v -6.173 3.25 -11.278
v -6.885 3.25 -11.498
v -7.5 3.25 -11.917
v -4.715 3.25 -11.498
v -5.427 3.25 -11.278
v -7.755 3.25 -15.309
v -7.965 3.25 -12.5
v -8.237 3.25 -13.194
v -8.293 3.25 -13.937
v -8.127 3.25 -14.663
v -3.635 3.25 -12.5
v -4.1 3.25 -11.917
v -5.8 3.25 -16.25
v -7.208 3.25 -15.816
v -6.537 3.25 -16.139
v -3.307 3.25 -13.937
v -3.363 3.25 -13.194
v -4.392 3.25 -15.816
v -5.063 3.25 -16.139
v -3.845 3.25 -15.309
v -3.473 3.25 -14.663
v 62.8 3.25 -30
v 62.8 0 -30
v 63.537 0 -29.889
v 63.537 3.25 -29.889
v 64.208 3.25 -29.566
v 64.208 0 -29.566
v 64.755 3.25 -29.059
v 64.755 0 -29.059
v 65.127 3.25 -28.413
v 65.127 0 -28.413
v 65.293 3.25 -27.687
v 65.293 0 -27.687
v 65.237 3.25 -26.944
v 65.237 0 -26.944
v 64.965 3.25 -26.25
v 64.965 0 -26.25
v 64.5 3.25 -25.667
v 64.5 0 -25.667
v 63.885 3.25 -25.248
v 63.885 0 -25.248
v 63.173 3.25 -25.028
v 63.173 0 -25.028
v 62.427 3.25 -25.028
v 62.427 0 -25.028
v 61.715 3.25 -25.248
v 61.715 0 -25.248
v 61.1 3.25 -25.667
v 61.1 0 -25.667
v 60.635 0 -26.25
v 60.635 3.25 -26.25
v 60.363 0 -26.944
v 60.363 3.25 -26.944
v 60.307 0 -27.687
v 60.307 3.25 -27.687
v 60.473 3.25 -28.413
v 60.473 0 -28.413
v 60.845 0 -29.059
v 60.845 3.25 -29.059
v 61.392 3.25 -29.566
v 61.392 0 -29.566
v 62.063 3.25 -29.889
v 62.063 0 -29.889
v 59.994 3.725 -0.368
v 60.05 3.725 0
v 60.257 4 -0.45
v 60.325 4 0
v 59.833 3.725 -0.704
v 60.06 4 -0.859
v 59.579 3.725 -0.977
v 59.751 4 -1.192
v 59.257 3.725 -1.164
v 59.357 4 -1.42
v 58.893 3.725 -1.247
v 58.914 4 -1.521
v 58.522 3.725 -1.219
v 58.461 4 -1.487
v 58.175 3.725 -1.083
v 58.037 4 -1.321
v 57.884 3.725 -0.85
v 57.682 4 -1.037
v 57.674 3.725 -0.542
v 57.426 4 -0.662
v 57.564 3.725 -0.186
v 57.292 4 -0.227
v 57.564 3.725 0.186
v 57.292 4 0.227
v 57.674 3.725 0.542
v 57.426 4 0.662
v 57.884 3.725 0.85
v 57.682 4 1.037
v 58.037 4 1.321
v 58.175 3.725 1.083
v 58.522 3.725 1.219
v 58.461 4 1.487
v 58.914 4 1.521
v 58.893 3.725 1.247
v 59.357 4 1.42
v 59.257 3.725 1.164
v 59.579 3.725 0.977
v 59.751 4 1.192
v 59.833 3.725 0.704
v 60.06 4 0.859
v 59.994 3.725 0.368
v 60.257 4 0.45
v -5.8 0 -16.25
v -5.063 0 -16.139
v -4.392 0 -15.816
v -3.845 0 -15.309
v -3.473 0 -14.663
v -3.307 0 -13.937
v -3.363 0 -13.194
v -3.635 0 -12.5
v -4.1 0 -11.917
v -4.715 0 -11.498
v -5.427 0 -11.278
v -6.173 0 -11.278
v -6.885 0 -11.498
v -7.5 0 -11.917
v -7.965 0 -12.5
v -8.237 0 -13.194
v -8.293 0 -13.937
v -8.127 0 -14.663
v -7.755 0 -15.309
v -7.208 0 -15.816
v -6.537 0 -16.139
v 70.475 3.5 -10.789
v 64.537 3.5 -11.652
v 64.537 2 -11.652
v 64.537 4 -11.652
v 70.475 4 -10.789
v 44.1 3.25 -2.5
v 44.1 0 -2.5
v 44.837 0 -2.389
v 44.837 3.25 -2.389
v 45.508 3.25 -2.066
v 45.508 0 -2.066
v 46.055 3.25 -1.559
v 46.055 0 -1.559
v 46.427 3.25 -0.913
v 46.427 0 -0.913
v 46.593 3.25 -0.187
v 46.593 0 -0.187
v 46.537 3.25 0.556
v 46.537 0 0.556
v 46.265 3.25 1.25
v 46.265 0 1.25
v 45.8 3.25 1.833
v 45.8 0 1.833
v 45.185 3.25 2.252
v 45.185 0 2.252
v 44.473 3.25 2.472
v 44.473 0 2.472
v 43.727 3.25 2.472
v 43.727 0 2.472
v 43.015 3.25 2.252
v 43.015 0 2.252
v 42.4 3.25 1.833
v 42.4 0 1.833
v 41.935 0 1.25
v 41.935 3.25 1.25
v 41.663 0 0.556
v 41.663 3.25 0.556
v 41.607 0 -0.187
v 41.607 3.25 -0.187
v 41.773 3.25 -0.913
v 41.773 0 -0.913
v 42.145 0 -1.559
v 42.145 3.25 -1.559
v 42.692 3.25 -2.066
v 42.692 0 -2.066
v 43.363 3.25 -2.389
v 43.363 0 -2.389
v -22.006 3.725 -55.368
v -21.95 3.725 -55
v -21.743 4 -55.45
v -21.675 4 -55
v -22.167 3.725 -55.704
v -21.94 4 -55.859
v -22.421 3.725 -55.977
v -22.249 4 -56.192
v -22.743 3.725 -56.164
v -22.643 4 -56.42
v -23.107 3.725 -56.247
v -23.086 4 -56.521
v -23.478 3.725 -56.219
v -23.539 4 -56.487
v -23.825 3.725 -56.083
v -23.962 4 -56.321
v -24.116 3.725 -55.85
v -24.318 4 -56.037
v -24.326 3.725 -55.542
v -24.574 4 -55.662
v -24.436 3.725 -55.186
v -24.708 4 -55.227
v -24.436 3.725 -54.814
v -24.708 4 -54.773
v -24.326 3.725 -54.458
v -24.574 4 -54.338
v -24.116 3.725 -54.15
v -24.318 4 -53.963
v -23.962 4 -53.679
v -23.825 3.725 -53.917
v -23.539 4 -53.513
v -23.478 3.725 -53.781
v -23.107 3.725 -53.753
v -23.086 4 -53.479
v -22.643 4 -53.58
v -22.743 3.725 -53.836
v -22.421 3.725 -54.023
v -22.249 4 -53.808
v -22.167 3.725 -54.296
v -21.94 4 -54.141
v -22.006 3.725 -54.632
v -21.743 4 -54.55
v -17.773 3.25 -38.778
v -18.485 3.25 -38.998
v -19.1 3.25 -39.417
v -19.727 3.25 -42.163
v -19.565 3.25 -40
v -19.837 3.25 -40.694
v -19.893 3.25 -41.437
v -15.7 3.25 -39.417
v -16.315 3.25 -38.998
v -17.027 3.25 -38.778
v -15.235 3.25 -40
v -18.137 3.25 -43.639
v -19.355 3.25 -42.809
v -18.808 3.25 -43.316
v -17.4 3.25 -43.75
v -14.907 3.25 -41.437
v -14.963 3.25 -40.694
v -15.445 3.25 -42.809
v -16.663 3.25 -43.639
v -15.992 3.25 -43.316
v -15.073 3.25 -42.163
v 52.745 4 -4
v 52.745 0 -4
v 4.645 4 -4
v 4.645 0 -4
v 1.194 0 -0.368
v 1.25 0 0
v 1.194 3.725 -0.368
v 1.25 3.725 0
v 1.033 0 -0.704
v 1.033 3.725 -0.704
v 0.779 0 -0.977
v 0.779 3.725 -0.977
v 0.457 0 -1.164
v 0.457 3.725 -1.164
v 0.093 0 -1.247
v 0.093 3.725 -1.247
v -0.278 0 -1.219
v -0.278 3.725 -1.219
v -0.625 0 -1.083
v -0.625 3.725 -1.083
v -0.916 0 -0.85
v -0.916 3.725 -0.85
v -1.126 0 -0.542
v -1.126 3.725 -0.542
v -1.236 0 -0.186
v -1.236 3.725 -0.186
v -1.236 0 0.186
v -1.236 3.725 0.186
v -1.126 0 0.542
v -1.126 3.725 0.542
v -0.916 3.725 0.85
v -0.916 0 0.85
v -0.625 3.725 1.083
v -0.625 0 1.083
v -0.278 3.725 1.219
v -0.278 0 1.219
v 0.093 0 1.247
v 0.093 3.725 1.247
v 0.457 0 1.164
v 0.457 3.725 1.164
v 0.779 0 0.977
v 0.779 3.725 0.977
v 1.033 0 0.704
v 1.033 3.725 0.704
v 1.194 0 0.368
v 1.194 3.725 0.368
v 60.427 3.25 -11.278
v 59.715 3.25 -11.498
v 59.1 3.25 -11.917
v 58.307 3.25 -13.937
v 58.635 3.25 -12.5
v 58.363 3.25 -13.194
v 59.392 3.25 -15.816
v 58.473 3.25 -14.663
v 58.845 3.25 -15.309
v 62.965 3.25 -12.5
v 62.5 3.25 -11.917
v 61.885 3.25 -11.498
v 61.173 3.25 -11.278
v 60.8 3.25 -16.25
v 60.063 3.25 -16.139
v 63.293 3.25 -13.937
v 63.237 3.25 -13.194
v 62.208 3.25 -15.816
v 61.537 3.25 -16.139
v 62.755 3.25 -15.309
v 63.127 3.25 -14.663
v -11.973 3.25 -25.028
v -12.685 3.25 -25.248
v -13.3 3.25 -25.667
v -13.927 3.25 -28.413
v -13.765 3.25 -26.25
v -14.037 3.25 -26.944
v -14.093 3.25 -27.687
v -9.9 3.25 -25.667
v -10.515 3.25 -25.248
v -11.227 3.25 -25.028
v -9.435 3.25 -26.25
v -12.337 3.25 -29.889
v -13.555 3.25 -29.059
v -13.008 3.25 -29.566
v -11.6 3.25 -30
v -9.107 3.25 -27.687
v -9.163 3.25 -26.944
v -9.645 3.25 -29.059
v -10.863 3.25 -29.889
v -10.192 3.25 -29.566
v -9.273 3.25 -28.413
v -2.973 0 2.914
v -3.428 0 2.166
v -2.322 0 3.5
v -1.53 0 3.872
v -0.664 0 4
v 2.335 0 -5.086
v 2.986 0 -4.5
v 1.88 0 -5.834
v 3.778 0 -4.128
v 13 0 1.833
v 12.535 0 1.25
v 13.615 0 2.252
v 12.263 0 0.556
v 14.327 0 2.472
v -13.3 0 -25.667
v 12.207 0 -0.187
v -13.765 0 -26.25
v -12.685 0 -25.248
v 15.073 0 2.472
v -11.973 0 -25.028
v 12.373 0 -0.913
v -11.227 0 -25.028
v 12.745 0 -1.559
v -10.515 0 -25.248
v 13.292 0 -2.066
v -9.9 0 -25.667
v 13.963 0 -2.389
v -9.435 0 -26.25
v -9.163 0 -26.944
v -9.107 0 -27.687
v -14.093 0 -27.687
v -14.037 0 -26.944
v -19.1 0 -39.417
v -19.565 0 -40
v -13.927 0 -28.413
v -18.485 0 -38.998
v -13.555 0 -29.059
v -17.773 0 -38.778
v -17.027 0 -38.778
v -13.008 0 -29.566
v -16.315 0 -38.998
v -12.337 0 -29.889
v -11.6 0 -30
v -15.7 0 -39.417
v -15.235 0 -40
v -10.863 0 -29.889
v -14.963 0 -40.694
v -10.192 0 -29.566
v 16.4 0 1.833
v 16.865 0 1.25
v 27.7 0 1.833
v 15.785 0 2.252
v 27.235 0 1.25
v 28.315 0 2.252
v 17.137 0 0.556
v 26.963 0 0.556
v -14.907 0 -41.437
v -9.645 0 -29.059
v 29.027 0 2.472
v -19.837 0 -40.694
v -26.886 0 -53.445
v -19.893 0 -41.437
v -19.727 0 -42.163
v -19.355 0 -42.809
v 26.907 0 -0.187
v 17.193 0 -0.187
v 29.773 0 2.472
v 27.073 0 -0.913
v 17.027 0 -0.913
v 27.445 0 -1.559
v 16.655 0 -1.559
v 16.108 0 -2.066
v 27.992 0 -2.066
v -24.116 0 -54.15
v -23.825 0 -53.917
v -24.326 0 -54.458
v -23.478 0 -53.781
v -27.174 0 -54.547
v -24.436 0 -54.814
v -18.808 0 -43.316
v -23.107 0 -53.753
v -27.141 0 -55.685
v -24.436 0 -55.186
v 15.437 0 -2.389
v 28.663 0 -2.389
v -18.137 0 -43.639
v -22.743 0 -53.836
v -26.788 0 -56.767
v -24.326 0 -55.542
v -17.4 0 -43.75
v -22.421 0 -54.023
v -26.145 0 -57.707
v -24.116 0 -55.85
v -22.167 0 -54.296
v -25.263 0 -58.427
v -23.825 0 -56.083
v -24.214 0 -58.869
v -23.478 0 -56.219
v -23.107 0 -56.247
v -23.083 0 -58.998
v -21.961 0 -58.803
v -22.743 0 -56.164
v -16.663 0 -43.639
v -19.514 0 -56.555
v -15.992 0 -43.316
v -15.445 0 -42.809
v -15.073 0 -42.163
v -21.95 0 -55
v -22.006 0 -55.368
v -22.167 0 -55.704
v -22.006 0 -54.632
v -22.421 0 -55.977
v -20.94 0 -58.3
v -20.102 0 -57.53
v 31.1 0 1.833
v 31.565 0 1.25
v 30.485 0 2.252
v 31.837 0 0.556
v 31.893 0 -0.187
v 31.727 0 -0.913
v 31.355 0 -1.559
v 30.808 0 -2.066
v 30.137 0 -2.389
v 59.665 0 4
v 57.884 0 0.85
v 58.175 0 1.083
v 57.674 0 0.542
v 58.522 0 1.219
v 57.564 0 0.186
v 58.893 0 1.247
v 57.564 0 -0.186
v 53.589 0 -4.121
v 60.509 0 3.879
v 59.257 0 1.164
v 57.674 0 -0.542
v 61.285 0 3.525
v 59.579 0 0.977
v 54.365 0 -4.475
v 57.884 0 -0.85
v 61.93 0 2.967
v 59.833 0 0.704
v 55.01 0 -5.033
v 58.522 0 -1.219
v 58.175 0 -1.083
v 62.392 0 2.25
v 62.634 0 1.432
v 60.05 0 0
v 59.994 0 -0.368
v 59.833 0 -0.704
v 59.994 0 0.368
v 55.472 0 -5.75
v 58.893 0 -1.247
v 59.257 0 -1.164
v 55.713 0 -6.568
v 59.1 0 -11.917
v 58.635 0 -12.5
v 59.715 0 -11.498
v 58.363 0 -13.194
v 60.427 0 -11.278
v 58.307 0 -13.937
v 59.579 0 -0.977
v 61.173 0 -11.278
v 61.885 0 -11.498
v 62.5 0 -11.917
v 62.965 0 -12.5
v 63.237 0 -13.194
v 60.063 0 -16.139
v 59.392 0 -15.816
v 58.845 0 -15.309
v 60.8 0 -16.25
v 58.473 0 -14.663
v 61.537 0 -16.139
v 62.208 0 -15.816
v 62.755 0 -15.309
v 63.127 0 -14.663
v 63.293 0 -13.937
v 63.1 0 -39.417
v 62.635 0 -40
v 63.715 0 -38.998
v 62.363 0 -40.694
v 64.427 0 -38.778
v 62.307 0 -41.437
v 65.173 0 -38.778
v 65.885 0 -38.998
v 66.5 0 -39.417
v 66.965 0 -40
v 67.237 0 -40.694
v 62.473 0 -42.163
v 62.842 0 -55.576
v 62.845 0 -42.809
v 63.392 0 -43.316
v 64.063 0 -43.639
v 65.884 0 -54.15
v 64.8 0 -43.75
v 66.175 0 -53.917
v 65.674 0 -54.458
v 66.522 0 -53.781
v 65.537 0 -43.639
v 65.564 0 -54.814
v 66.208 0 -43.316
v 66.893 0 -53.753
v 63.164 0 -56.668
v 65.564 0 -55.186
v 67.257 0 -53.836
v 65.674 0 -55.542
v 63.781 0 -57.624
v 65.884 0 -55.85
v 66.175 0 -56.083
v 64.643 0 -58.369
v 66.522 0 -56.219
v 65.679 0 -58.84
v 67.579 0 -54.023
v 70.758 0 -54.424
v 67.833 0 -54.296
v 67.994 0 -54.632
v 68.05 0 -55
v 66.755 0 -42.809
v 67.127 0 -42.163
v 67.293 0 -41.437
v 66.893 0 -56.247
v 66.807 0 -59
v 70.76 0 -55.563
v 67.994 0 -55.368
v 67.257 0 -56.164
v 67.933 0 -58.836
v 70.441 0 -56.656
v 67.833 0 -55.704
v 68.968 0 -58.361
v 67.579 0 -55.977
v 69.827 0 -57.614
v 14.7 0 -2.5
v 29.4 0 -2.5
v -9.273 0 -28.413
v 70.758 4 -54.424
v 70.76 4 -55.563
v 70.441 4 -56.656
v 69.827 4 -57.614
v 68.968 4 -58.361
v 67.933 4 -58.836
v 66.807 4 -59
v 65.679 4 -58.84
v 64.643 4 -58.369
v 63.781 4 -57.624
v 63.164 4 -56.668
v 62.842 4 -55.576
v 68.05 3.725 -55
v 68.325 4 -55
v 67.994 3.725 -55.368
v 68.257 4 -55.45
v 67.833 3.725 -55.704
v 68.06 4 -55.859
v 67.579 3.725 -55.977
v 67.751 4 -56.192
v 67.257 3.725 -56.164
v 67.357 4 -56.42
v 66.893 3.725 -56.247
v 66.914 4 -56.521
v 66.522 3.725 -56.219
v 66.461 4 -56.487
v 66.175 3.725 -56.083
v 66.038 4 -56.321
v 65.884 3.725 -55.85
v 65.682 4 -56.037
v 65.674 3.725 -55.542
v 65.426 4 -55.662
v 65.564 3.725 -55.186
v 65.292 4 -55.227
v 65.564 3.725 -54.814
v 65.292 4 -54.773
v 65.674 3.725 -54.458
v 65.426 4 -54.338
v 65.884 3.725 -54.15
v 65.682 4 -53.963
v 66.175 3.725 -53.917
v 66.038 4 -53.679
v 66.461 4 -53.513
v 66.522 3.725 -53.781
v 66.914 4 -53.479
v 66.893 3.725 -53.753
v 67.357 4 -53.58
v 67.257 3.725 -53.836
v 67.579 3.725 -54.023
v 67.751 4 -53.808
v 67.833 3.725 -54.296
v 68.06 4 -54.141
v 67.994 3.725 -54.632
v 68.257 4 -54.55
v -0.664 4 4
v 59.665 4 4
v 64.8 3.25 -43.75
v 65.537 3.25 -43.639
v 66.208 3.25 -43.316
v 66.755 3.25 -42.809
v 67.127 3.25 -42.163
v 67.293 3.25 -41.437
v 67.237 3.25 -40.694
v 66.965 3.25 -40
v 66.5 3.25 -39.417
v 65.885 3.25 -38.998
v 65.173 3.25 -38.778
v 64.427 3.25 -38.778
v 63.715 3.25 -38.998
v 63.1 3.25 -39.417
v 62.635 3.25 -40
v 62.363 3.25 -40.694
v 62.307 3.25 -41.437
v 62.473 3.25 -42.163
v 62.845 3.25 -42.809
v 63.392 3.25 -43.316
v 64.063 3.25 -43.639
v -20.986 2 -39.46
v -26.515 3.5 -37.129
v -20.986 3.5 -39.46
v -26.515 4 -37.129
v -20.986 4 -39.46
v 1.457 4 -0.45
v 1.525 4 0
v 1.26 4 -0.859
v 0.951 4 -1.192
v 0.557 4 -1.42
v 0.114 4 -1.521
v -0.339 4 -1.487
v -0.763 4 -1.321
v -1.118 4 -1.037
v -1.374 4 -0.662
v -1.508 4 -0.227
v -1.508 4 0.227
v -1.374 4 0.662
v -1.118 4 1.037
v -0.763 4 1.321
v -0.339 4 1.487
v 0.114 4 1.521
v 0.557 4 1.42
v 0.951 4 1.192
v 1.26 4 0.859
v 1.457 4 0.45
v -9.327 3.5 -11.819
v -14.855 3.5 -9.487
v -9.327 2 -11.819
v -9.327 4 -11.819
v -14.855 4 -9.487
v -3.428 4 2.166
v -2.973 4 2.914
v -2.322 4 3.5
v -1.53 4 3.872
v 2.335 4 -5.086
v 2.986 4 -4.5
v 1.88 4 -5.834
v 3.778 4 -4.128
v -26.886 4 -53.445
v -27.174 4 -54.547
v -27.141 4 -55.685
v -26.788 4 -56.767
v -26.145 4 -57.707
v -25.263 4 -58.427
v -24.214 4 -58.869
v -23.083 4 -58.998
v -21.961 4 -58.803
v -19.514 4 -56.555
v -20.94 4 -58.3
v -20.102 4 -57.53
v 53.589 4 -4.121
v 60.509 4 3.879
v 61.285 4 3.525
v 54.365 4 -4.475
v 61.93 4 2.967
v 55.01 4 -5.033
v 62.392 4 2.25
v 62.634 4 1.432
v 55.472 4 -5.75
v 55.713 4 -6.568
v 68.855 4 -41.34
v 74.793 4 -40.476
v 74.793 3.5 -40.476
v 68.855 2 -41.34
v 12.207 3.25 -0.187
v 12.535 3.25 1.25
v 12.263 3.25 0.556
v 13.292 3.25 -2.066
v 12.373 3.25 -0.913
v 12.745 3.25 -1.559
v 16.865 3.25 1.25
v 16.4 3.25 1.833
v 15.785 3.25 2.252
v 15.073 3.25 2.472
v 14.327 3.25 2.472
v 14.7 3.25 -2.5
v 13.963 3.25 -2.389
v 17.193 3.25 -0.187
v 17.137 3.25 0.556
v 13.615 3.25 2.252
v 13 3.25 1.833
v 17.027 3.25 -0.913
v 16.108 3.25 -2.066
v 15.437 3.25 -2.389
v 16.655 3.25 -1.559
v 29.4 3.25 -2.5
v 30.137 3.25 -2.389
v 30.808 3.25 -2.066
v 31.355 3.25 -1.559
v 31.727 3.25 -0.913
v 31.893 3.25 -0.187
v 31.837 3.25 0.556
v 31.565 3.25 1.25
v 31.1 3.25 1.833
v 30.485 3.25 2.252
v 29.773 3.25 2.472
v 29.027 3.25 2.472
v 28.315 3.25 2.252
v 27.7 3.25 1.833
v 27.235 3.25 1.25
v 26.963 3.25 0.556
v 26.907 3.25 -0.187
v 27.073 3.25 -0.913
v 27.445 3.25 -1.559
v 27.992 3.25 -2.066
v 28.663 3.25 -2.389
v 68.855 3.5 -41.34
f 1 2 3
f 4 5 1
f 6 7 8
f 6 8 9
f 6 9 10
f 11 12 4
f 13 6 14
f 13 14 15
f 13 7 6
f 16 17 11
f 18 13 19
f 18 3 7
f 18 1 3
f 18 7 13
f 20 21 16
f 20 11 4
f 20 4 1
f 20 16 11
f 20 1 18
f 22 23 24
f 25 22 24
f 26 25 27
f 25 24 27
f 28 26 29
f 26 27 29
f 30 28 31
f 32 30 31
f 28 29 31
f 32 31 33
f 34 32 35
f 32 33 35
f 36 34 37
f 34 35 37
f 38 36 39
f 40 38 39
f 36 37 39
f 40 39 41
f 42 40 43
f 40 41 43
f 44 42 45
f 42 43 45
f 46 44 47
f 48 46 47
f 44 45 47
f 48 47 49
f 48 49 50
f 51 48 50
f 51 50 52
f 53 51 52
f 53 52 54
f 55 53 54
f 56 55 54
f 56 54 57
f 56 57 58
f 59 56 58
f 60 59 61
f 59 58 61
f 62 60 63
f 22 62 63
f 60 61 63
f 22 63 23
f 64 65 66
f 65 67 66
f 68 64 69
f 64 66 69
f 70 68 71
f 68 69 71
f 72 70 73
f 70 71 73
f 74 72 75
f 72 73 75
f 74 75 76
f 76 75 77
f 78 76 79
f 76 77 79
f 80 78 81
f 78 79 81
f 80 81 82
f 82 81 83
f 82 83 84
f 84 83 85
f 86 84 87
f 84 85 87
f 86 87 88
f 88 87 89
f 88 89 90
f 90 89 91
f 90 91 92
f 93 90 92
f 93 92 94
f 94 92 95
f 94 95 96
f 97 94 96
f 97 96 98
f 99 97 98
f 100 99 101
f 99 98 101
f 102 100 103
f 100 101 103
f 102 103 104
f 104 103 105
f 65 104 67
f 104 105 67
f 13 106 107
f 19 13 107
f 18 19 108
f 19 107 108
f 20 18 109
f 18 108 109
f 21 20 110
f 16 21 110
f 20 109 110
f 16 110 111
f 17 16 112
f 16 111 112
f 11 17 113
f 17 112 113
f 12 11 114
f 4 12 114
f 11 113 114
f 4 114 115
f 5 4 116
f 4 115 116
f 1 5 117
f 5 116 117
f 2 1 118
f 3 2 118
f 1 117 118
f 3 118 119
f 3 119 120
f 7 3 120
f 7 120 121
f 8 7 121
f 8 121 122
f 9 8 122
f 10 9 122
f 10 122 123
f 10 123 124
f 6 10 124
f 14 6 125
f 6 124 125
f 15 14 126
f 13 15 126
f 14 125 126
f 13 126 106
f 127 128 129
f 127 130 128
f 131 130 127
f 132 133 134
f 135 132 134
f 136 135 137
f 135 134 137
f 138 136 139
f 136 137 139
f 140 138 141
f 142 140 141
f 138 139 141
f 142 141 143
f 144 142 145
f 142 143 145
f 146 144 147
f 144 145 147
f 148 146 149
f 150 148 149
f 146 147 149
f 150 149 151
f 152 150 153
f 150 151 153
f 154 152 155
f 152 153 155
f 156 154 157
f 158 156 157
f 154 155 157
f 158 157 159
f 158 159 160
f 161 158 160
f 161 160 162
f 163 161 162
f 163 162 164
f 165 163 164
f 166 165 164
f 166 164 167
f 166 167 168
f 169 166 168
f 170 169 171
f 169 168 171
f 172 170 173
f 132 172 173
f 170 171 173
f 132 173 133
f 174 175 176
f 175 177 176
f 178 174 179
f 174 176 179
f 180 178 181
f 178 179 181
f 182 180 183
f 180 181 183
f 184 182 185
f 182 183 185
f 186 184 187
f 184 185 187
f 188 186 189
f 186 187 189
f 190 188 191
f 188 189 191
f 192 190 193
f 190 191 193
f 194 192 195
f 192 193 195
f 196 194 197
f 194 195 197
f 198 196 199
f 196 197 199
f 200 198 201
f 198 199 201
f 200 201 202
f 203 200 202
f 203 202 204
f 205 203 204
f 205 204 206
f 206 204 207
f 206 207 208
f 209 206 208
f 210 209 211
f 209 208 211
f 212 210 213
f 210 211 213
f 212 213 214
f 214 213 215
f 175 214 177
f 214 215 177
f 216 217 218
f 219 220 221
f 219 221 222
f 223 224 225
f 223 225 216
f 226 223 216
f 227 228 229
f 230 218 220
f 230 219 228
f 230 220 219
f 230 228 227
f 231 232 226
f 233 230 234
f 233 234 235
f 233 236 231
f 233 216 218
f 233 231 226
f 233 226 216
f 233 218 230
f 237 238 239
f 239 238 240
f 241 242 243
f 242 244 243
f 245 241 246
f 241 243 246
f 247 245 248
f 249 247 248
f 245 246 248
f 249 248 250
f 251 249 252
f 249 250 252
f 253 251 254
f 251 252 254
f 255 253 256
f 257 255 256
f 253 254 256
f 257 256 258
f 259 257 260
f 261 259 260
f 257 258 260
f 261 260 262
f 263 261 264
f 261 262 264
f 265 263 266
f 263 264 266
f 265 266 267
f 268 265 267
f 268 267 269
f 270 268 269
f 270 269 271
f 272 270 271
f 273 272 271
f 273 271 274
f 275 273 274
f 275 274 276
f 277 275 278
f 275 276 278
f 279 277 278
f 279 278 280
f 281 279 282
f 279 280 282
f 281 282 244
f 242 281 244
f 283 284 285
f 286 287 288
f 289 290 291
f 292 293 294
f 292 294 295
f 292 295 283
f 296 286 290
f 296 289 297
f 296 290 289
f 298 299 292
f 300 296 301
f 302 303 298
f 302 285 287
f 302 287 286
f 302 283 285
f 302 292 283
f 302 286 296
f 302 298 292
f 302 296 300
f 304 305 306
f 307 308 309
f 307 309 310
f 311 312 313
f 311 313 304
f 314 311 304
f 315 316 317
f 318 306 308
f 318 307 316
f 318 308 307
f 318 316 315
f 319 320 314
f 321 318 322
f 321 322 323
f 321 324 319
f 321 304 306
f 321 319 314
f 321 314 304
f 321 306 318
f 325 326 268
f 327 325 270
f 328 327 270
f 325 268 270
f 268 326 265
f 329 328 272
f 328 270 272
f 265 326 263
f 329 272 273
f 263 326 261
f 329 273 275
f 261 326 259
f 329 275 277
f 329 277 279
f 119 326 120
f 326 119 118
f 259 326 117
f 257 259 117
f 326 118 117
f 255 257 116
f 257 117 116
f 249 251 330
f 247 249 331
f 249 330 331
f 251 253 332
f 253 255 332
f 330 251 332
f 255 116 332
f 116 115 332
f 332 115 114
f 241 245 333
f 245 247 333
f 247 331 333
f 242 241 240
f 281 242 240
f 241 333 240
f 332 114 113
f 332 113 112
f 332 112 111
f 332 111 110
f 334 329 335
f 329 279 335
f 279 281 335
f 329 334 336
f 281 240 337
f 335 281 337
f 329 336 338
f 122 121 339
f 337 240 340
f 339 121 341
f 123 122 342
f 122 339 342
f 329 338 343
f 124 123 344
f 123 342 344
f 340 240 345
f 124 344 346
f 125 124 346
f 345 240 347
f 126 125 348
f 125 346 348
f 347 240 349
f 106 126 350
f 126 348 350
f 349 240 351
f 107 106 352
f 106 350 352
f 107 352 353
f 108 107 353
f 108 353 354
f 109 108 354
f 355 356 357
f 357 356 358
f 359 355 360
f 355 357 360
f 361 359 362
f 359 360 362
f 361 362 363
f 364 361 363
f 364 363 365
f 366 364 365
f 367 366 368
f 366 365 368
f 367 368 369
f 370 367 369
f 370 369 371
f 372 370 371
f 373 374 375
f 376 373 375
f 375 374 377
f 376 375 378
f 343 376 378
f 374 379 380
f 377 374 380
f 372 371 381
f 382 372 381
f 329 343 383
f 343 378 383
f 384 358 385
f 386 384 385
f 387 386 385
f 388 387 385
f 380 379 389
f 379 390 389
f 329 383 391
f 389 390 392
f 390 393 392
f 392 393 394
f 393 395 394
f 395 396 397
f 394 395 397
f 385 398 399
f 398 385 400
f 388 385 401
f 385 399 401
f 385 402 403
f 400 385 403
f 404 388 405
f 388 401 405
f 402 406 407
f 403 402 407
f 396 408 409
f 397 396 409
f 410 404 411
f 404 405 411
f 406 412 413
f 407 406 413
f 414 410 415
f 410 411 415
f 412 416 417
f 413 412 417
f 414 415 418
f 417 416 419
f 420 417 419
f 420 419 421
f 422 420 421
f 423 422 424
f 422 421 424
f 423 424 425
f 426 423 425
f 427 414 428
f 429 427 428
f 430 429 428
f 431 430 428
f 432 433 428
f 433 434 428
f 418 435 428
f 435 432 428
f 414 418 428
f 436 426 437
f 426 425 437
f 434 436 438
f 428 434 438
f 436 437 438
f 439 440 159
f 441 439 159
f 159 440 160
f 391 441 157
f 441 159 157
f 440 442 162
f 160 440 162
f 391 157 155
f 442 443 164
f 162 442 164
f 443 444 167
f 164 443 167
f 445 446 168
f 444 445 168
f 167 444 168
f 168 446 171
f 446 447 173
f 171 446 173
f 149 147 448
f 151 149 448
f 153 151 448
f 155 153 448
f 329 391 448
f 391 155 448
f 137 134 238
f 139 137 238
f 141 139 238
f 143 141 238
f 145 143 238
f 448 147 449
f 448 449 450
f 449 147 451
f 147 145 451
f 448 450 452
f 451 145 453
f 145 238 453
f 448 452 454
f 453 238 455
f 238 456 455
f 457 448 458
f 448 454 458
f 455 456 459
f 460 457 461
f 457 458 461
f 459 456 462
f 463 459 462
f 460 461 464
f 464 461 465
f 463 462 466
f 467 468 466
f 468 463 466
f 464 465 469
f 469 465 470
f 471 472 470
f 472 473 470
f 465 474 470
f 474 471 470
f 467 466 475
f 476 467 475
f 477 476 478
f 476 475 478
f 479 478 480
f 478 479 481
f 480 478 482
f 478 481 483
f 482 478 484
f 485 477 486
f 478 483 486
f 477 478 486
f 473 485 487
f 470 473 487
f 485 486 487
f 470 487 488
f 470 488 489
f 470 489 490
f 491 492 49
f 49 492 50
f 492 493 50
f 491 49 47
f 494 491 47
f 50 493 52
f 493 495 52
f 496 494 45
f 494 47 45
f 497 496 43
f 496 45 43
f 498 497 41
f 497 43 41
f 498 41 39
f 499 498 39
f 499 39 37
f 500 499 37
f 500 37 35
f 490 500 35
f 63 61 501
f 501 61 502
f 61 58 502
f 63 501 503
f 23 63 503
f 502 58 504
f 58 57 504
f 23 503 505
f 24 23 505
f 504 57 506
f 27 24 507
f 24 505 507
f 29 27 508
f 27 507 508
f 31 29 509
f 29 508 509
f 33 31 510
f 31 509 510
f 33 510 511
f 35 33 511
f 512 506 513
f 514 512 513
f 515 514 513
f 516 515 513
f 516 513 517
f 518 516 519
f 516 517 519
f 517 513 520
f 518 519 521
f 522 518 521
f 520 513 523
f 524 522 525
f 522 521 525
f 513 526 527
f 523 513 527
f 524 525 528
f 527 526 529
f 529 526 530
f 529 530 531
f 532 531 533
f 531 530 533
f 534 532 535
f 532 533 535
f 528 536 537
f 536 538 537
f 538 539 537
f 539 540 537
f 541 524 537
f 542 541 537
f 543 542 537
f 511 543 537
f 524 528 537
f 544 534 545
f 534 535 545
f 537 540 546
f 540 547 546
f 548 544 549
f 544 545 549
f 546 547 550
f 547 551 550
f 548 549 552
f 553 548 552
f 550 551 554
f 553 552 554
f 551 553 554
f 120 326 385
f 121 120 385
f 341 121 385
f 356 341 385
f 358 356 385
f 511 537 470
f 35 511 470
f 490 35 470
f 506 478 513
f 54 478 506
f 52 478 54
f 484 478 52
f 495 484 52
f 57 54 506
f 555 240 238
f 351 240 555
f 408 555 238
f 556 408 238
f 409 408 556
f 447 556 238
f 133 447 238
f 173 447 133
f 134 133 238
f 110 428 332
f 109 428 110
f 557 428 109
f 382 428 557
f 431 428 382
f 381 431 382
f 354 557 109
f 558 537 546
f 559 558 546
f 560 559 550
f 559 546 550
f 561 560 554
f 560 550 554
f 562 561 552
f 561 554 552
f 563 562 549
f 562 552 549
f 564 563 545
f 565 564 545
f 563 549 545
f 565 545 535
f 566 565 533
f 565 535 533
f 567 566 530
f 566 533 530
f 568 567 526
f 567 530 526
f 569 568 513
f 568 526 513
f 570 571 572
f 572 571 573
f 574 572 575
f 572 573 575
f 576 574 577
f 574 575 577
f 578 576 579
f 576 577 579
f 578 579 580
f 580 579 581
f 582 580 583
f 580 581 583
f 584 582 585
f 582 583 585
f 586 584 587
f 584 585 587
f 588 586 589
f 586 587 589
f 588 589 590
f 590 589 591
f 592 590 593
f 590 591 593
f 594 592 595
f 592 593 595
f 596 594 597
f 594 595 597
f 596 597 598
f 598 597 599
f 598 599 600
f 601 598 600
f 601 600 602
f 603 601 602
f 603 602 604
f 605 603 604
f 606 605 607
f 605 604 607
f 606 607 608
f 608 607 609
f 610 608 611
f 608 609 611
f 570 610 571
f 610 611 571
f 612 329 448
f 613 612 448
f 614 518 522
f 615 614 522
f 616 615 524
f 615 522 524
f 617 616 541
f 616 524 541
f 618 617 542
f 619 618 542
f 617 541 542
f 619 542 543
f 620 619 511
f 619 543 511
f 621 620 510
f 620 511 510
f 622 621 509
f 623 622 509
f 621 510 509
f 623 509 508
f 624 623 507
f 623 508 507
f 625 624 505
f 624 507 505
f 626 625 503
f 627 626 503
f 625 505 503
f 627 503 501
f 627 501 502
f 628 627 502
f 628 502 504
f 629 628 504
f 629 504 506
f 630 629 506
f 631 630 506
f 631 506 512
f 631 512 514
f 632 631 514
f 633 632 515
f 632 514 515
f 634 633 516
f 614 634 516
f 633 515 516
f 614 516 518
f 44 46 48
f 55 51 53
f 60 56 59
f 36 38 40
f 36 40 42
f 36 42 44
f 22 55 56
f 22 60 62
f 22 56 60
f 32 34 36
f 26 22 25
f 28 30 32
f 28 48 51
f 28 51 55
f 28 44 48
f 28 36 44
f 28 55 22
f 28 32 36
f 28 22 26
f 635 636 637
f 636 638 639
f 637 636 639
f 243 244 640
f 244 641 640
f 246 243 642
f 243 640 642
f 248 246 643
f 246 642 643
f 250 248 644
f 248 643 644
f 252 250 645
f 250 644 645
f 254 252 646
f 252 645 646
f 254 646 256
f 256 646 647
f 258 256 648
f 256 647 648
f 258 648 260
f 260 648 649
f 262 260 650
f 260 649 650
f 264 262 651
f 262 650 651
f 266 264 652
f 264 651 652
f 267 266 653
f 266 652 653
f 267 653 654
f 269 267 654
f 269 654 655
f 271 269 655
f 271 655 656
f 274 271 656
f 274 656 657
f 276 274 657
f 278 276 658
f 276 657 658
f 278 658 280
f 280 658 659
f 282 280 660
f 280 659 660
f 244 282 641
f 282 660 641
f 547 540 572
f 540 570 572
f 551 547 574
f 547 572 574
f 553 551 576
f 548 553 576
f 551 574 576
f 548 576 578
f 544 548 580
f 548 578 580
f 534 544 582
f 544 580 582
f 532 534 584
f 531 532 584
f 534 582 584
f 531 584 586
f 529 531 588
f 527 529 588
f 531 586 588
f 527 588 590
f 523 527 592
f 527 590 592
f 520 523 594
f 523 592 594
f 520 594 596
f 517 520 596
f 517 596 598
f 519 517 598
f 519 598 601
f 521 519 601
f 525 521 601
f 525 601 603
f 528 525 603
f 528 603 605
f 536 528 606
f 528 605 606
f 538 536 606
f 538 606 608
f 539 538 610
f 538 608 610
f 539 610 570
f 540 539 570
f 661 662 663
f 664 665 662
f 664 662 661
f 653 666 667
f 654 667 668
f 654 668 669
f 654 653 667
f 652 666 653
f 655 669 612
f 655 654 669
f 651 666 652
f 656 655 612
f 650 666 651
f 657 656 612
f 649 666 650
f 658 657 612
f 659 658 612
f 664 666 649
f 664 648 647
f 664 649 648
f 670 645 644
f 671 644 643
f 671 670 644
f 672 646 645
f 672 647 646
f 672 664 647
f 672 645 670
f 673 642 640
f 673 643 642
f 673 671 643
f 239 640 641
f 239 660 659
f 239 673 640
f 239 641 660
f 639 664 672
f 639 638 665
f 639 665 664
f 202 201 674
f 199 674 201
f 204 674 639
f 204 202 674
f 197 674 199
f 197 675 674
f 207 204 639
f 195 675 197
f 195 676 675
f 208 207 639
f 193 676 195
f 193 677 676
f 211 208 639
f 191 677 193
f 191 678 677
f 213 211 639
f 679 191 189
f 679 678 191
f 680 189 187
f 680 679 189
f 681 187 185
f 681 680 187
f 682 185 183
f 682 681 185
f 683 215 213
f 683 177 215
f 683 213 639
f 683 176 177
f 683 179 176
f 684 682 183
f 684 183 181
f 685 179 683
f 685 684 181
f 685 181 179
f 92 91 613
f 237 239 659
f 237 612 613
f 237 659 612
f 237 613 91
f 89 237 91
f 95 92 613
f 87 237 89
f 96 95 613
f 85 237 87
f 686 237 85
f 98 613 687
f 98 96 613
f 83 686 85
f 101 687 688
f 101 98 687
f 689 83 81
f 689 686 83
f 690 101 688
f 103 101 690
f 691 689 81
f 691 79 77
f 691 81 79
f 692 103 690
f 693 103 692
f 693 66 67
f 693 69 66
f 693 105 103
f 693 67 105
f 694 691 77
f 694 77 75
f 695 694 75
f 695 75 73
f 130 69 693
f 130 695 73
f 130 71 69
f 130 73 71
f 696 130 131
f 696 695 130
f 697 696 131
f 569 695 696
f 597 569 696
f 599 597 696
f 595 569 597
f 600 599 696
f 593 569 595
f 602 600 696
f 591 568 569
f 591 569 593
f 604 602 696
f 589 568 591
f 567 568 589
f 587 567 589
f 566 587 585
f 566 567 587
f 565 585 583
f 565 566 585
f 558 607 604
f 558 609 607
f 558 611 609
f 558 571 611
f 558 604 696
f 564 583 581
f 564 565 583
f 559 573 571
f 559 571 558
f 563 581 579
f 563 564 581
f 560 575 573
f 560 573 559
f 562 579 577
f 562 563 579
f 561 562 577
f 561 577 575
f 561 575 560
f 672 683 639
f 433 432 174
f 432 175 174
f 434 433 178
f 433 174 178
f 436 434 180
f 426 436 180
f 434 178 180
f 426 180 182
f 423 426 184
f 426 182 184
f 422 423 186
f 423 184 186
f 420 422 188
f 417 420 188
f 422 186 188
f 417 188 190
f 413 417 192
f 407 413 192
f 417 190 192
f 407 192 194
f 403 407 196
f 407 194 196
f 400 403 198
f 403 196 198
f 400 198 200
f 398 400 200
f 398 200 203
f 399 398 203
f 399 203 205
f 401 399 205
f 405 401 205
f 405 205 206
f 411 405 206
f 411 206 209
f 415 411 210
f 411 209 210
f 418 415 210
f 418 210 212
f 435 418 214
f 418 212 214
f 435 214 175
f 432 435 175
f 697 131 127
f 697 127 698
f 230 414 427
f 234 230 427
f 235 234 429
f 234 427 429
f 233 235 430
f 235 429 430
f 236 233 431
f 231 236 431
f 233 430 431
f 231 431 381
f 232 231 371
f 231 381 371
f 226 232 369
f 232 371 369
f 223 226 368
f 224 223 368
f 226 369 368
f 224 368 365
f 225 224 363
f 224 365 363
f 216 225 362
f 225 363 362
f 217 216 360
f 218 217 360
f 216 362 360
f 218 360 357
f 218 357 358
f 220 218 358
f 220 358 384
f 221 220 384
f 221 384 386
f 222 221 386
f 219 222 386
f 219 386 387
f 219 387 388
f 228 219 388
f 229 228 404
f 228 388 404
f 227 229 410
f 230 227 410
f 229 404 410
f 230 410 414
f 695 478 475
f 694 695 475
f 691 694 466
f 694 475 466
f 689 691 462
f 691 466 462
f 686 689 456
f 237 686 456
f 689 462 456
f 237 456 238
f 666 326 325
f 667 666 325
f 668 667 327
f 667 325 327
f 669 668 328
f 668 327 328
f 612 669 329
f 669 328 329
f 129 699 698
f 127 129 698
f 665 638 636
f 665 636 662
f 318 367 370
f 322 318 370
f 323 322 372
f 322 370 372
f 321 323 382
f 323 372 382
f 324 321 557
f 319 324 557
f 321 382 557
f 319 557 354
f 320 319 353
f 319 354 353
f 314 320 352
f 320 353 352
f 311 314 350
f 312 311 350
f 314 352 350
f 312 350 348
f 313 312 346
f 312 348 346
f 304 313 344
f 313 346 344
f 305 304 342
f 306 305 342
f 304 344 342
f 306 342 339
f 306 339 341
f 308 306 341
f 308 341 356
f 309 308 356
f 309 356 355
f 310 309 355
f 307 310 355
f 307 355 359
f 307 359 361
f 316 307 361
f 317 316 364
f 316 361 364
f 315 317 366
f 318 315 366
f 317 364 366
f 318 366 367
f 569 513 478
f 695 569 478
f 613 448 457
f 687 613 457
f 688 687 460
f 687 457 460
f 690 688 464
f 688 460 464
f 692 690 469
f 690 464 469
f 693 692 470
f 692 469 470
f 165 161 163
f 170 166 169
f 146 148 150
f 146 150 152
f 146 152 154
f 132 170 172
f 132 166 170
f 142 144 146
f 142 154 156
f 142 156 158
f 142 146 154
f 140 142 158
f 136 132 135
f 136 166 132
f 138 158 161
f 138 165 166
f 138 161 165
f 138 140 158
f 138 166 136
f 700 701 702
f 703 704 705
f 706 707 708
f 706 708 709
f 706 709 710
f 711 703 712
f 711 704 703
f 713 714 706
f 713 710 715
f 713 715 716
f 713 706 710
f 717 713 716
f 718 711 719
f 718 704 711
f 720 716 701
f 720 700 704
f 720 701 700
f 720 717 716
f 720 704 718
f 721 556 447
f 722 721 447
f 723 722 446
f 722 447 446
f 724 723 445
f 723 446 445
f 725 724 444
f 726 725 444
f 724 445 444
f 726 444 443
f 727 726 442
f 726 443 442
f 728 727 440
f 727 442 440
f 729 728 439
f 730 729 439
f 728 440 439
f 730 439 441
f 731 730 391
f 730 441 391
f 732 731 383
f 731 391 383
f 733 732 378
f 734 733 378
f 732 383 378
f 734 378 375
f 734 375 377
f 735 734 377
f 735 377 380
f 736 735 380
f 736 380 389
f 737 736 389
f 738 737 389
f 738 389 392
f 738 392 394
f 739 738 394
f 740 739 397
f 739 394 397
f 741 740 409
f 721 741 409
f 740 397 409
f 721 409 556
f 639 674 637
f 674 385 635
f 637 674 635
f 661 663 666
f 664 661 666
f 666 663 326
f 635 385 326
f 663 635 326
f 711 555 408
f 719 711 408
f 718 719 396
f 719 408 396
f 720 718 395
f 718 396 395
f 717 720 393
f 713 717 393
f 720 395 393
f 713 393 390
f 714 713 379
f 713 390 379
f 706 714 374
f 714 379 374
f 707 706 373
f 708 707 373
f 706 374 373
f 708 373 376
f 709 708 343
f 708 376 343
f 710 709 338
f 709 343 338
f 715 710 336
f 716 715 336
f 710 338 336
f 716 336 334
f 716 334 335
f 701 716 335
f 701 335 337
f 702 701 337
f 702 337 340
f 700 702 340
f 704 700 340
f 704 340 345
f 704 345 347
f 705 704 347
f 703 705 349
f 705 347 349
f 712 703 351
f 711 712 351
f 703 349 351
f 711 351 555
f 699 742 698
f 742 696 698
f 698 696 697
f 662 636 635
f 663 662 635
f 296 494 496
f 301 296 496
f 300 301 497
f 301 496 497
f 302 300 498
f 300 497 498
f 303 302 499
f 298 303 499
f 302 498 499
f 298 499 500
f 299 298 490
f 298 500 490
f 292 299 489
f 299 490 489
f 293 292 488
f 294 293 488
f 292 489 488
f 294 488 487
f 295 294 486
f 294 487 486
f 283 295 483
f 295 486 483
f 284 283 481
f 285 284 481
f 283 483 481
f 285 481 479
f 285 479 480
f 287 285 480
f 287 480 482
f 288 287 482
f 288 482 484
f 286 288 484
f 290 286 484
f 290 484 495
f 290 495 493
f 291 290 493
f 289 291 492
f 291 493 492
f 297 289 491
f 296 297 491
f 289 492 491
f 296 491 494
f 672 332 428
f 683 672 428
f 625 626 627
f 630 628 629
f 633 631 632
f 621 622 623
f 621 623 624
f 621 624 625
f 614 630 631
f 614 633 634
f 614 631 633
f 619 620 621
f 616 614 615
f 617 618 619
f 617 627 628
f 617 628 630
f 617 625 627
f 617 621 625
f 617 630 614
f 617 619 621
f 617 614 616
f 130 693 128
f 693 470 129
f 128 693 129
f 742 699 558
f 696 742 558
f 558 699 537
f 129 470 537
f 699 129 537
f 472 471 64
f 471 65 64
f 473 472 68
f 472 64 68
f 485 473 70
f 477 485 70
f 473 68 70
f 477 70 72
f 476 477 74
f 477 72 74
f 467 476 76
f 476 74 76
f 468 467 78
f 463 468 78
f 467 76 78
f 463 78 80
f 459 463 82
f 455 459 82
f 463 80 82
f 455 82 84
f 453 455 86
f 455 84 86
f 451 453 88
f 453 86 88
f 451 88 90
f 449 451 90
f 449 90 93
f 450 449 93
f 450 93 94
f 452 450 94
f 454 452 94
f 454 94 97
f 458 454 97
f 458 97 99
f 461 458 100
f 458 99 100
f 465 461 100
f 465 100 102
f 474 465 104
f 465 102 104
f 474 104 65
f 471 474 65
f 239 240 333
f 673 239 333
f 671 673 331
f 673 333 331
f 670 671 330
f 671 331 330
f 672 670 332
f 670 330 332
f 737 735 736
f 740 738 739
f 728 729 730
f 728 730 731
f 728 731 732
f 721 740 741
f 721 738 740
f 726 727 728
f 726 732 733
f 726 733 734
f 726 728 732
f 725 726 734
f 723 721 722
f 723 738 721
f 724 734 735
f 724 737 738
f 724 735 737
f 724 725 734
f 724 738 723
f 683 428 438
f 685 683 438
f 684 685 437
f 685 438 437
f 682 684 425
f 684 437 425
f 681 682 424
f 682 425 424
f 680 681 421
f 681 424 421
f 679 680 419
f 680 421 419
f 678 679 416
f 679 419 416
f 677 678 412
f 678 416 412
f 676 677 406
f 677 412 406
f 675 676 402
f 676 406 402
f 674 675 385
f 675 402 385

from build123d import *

# Parameters (mm, degrees)
BOSS_EXTRUDE1_DEPTH = 4
SKETCH5_R           = 2.5
CUT_EXTRUDE1_DEPTH  = 3.25
SKETCH6_W           = 30
SKETCH6_H           = 0.5
BOSS_EXTRUDE2_DEPTH = 6
BOSS_EXTRUDE3_DEPTH = 30
SKETCH8_W           = 30
SKETCH8_H           = 0.5
BOSS_EXTRUDE4_DEPTH = 6
BOSS_EXTRUDE5_DEPTH = 30


# Read off the part's stored shape, not the designer's step: M3x0.5 Tapped Hole1
with BuildPart() as part:
    # Sketch1 → Boss-Extrude1 (new body)
    with BuildSketch(Plane(origin=(0, 0, 0), x_dir=(1, 0, 0), z_dir=(0, 1, 0))):
        with BuildLine():
            Line((-26.885531635, 53.445375747), (-3.427655647, -2.16596819))
            ThreePointArc((-3.427655647, -2.16596819), (-2.322135184, -3.499790448), (-0.663506921, -4))
            Line((-0.663506921, -4), (59.665068599, -4))
            ThreePointArc((59.665068599, -4), (61.627788827, -3.268860795), (62.633827917, -1.431819537))
            Line((62.633827917, -1.431819537), (70.758345757, 54.424240617))
            ThreePointArc((70.758345757, 54.424240617), (67.375759383, 58.958345757), (62.841654243, 55.575759383))
            Line((62.841654243, 55.575759383), (55.713279127, 6.568180463))
            ThreePointArc((55.713279127, 6.568180463), (54.707240038, 4.731139205), (52.744519809, 4))
            Line((52.744519809, 4), (4.644548446, 4))
            ThreePointArc((4.644548446, 4), (2.985920183, 4.500209552), (1.88039972, 5.83403181))
            Line((1.88039972, 5.83403181), (-19.514468365, 56.554624253))
            ThreePointArc((-19.514468365, 56.554624253), (-24.754624253, 58.685531635), (-26.885531635, 53.445375747))
        make_face()
    extrude(amount=BOSS_EXTRUDE1_DEPTH)

    # M3x0.5 Tapped Hole1 outline → M3x0.5 Tapped Hole1 (revolve, cut)
    with BuildSketch(Plane(origin=(-23.2, 0, -55), x_dir=(1, 0, 0), z_dir=(0, 0, 1))):
        Polygon((0, 0), (1.25, 0), (1.25, 3.725), (1.525, 4), (0, 4), align=None)
    revolve(axis=Axis((-23.2, 0, -55), (0, 1, 0)), mode=Mode.SUBTRACT)

    # M3x0.5 Tapped Hole1 2 outline → M3x0.5 Tapped Hole1 2 (revolve, cut)
    with BuildSketch(Plane.XY):
        Polygon((0, 0), (1.25, 0), (1.25, 3.725), (1.525, 4), (0, 4), align=None)
    revolve(axis=Axis((0, 0, 0), (0, 1, 0)), mode=Mode.SUBTRACT)

    # M3x0.5 Tapped Hole1 3 outline → M3x0.5 Tapped Hole1 3 (revolve, cut)
    with BuildSketch(Plane(origin=(58.8, 0, 0), x_dir=(1, 0, 0), z_dir=(0, 0, 1))):
        Polygon((0, 0), (1.25, 0), (1.25, 3.725), (1.525, 4), (0, 4), align=None)
    revolve(axis=Axis((58.8, 0, 0), (0, 1, 0)), mode=Mode.SUBTRACT)

    # M3x0.5 Tapped Hole1 4 outline → M3x0.5 Tapped Hole1 4 (revolve, cut)
    with BuildSketch(Plane(origin=(66.8, 0, -55), x_dir=(1, 0, 0), z_dir=(0, 0, 1))):
        Polygon((0, 0), (1.25, 0), (1.25, 3.725), (1.525, 4), (0, 4), align=None)
    revolve(axis=Axis((66.8, 0, -55), (0, 1, 0)), mode=Mode.SUBTRACT)

    # Sketch5 → Cut-Extrude1 (cut)
    with BuildSketch(Plane.XZ):
        with Locations(Location((-17.4, -41.25, 0), (0, 0, 270))):
            Circle(SKETCH5_R)
        with Locations(Location((29.4, 0, 0), (0, 0, 270))):
            Circle(SKETCH5_R)
        with Locations(Location((60.8, -13.75, 0), (0, 0, 270))):
            Circle(SKETCH5_R)
        with Locations(Location((-5.8, -13.75, 0), (0, 0, 270))):
            Circle(SKETCH5_R)
        with Locations(Location((64.8, -41.25, 0), (0, 0, 270))):
            Circle(SKETCH5_R)
        with Locations(Location((-11.6, -27.5, 0), (0, 0, 270))):
            Circle(SKETCH5_R)
        with Locations(Location((14.7, 0, 0), (0, 0, 270))):
            Circle(SKETCH5_R)
        with Locations(Location((44.1, 0, 0), (0, 0, 270))):
            Circle(SKETCH5_R)
        with Locations(Location((62.8, -27.5, 0), (0, 0, 270))):
            Circle(SKETCH5_R)
    extrude(amount=-CUT_EXTRUDE1_DEPTH, mode=Mode.SUBTRACT)

    # Sketch6 → Boss-Extrude2 (add)
    with BuildSketch(Plane(origin=(-3.685531635, 0, 1.554624253), x_dir=(0.38865606330829405, 0, 0.921382908705007), z_dir=(-0.921382908705007, 0, 0.38865606330829405))):
        with Locations((-29.514686863, 3.75)):
            Rectangle(SKETCH6_W, SKETCH6_H)
    extrude(amount=BOSS_EXTRUDE2_DEPTH)

    # Sketch7 → Boss-Extrude3 (add)
    with BuildSketch(Plane(origin=(-5.641221056, 0, -13.373584401), x_dir=(0.9213829087050069, 0, -0.3886560633082941), z_dir=(0.3886560633082942, 0, 0.921382908705007))):
        Polygon((-4, 2), (-4, 3.5), (-10, 3.5), align=None)
    extrude(amount=-BOSS_EXTRUDE3_DEPTH)

    # Sketch8 → Boss-Extrude4 (add)
    with BuildSketch(Plane(origin=(61.540087421, 0, 8.951285443), x_dir=(0.14393984571411056, 0, -0.9895864392845114), z_dir=(0.9895864392845114, 0, 0.14393984571411056))):
        with Locations((35.820515092, 3.75)):
            Rectangle(SKETCH8_W, SKETCH8_H)
    extrude(amount=BOSS_EXTRUDE4_DEPTH)

    # Sketch9 → Boss-Extrude5 (add)
    with BuildSketch(Plane(origin=(2.99690173, 0, -20.603699394), x_dir=(0.9895864392845114, 0, 0.14393984571411056), z_dir=(-0.14393984571411056, 0, 0.9895864392845114))):
        Polygon((68.18768263, 3.5), (62.18768263, 3.5), (62.18768263, 2), align=None)
    extrude(amount=-BOSS_EXTRUDE5_DEPTH)


solid = part.part
